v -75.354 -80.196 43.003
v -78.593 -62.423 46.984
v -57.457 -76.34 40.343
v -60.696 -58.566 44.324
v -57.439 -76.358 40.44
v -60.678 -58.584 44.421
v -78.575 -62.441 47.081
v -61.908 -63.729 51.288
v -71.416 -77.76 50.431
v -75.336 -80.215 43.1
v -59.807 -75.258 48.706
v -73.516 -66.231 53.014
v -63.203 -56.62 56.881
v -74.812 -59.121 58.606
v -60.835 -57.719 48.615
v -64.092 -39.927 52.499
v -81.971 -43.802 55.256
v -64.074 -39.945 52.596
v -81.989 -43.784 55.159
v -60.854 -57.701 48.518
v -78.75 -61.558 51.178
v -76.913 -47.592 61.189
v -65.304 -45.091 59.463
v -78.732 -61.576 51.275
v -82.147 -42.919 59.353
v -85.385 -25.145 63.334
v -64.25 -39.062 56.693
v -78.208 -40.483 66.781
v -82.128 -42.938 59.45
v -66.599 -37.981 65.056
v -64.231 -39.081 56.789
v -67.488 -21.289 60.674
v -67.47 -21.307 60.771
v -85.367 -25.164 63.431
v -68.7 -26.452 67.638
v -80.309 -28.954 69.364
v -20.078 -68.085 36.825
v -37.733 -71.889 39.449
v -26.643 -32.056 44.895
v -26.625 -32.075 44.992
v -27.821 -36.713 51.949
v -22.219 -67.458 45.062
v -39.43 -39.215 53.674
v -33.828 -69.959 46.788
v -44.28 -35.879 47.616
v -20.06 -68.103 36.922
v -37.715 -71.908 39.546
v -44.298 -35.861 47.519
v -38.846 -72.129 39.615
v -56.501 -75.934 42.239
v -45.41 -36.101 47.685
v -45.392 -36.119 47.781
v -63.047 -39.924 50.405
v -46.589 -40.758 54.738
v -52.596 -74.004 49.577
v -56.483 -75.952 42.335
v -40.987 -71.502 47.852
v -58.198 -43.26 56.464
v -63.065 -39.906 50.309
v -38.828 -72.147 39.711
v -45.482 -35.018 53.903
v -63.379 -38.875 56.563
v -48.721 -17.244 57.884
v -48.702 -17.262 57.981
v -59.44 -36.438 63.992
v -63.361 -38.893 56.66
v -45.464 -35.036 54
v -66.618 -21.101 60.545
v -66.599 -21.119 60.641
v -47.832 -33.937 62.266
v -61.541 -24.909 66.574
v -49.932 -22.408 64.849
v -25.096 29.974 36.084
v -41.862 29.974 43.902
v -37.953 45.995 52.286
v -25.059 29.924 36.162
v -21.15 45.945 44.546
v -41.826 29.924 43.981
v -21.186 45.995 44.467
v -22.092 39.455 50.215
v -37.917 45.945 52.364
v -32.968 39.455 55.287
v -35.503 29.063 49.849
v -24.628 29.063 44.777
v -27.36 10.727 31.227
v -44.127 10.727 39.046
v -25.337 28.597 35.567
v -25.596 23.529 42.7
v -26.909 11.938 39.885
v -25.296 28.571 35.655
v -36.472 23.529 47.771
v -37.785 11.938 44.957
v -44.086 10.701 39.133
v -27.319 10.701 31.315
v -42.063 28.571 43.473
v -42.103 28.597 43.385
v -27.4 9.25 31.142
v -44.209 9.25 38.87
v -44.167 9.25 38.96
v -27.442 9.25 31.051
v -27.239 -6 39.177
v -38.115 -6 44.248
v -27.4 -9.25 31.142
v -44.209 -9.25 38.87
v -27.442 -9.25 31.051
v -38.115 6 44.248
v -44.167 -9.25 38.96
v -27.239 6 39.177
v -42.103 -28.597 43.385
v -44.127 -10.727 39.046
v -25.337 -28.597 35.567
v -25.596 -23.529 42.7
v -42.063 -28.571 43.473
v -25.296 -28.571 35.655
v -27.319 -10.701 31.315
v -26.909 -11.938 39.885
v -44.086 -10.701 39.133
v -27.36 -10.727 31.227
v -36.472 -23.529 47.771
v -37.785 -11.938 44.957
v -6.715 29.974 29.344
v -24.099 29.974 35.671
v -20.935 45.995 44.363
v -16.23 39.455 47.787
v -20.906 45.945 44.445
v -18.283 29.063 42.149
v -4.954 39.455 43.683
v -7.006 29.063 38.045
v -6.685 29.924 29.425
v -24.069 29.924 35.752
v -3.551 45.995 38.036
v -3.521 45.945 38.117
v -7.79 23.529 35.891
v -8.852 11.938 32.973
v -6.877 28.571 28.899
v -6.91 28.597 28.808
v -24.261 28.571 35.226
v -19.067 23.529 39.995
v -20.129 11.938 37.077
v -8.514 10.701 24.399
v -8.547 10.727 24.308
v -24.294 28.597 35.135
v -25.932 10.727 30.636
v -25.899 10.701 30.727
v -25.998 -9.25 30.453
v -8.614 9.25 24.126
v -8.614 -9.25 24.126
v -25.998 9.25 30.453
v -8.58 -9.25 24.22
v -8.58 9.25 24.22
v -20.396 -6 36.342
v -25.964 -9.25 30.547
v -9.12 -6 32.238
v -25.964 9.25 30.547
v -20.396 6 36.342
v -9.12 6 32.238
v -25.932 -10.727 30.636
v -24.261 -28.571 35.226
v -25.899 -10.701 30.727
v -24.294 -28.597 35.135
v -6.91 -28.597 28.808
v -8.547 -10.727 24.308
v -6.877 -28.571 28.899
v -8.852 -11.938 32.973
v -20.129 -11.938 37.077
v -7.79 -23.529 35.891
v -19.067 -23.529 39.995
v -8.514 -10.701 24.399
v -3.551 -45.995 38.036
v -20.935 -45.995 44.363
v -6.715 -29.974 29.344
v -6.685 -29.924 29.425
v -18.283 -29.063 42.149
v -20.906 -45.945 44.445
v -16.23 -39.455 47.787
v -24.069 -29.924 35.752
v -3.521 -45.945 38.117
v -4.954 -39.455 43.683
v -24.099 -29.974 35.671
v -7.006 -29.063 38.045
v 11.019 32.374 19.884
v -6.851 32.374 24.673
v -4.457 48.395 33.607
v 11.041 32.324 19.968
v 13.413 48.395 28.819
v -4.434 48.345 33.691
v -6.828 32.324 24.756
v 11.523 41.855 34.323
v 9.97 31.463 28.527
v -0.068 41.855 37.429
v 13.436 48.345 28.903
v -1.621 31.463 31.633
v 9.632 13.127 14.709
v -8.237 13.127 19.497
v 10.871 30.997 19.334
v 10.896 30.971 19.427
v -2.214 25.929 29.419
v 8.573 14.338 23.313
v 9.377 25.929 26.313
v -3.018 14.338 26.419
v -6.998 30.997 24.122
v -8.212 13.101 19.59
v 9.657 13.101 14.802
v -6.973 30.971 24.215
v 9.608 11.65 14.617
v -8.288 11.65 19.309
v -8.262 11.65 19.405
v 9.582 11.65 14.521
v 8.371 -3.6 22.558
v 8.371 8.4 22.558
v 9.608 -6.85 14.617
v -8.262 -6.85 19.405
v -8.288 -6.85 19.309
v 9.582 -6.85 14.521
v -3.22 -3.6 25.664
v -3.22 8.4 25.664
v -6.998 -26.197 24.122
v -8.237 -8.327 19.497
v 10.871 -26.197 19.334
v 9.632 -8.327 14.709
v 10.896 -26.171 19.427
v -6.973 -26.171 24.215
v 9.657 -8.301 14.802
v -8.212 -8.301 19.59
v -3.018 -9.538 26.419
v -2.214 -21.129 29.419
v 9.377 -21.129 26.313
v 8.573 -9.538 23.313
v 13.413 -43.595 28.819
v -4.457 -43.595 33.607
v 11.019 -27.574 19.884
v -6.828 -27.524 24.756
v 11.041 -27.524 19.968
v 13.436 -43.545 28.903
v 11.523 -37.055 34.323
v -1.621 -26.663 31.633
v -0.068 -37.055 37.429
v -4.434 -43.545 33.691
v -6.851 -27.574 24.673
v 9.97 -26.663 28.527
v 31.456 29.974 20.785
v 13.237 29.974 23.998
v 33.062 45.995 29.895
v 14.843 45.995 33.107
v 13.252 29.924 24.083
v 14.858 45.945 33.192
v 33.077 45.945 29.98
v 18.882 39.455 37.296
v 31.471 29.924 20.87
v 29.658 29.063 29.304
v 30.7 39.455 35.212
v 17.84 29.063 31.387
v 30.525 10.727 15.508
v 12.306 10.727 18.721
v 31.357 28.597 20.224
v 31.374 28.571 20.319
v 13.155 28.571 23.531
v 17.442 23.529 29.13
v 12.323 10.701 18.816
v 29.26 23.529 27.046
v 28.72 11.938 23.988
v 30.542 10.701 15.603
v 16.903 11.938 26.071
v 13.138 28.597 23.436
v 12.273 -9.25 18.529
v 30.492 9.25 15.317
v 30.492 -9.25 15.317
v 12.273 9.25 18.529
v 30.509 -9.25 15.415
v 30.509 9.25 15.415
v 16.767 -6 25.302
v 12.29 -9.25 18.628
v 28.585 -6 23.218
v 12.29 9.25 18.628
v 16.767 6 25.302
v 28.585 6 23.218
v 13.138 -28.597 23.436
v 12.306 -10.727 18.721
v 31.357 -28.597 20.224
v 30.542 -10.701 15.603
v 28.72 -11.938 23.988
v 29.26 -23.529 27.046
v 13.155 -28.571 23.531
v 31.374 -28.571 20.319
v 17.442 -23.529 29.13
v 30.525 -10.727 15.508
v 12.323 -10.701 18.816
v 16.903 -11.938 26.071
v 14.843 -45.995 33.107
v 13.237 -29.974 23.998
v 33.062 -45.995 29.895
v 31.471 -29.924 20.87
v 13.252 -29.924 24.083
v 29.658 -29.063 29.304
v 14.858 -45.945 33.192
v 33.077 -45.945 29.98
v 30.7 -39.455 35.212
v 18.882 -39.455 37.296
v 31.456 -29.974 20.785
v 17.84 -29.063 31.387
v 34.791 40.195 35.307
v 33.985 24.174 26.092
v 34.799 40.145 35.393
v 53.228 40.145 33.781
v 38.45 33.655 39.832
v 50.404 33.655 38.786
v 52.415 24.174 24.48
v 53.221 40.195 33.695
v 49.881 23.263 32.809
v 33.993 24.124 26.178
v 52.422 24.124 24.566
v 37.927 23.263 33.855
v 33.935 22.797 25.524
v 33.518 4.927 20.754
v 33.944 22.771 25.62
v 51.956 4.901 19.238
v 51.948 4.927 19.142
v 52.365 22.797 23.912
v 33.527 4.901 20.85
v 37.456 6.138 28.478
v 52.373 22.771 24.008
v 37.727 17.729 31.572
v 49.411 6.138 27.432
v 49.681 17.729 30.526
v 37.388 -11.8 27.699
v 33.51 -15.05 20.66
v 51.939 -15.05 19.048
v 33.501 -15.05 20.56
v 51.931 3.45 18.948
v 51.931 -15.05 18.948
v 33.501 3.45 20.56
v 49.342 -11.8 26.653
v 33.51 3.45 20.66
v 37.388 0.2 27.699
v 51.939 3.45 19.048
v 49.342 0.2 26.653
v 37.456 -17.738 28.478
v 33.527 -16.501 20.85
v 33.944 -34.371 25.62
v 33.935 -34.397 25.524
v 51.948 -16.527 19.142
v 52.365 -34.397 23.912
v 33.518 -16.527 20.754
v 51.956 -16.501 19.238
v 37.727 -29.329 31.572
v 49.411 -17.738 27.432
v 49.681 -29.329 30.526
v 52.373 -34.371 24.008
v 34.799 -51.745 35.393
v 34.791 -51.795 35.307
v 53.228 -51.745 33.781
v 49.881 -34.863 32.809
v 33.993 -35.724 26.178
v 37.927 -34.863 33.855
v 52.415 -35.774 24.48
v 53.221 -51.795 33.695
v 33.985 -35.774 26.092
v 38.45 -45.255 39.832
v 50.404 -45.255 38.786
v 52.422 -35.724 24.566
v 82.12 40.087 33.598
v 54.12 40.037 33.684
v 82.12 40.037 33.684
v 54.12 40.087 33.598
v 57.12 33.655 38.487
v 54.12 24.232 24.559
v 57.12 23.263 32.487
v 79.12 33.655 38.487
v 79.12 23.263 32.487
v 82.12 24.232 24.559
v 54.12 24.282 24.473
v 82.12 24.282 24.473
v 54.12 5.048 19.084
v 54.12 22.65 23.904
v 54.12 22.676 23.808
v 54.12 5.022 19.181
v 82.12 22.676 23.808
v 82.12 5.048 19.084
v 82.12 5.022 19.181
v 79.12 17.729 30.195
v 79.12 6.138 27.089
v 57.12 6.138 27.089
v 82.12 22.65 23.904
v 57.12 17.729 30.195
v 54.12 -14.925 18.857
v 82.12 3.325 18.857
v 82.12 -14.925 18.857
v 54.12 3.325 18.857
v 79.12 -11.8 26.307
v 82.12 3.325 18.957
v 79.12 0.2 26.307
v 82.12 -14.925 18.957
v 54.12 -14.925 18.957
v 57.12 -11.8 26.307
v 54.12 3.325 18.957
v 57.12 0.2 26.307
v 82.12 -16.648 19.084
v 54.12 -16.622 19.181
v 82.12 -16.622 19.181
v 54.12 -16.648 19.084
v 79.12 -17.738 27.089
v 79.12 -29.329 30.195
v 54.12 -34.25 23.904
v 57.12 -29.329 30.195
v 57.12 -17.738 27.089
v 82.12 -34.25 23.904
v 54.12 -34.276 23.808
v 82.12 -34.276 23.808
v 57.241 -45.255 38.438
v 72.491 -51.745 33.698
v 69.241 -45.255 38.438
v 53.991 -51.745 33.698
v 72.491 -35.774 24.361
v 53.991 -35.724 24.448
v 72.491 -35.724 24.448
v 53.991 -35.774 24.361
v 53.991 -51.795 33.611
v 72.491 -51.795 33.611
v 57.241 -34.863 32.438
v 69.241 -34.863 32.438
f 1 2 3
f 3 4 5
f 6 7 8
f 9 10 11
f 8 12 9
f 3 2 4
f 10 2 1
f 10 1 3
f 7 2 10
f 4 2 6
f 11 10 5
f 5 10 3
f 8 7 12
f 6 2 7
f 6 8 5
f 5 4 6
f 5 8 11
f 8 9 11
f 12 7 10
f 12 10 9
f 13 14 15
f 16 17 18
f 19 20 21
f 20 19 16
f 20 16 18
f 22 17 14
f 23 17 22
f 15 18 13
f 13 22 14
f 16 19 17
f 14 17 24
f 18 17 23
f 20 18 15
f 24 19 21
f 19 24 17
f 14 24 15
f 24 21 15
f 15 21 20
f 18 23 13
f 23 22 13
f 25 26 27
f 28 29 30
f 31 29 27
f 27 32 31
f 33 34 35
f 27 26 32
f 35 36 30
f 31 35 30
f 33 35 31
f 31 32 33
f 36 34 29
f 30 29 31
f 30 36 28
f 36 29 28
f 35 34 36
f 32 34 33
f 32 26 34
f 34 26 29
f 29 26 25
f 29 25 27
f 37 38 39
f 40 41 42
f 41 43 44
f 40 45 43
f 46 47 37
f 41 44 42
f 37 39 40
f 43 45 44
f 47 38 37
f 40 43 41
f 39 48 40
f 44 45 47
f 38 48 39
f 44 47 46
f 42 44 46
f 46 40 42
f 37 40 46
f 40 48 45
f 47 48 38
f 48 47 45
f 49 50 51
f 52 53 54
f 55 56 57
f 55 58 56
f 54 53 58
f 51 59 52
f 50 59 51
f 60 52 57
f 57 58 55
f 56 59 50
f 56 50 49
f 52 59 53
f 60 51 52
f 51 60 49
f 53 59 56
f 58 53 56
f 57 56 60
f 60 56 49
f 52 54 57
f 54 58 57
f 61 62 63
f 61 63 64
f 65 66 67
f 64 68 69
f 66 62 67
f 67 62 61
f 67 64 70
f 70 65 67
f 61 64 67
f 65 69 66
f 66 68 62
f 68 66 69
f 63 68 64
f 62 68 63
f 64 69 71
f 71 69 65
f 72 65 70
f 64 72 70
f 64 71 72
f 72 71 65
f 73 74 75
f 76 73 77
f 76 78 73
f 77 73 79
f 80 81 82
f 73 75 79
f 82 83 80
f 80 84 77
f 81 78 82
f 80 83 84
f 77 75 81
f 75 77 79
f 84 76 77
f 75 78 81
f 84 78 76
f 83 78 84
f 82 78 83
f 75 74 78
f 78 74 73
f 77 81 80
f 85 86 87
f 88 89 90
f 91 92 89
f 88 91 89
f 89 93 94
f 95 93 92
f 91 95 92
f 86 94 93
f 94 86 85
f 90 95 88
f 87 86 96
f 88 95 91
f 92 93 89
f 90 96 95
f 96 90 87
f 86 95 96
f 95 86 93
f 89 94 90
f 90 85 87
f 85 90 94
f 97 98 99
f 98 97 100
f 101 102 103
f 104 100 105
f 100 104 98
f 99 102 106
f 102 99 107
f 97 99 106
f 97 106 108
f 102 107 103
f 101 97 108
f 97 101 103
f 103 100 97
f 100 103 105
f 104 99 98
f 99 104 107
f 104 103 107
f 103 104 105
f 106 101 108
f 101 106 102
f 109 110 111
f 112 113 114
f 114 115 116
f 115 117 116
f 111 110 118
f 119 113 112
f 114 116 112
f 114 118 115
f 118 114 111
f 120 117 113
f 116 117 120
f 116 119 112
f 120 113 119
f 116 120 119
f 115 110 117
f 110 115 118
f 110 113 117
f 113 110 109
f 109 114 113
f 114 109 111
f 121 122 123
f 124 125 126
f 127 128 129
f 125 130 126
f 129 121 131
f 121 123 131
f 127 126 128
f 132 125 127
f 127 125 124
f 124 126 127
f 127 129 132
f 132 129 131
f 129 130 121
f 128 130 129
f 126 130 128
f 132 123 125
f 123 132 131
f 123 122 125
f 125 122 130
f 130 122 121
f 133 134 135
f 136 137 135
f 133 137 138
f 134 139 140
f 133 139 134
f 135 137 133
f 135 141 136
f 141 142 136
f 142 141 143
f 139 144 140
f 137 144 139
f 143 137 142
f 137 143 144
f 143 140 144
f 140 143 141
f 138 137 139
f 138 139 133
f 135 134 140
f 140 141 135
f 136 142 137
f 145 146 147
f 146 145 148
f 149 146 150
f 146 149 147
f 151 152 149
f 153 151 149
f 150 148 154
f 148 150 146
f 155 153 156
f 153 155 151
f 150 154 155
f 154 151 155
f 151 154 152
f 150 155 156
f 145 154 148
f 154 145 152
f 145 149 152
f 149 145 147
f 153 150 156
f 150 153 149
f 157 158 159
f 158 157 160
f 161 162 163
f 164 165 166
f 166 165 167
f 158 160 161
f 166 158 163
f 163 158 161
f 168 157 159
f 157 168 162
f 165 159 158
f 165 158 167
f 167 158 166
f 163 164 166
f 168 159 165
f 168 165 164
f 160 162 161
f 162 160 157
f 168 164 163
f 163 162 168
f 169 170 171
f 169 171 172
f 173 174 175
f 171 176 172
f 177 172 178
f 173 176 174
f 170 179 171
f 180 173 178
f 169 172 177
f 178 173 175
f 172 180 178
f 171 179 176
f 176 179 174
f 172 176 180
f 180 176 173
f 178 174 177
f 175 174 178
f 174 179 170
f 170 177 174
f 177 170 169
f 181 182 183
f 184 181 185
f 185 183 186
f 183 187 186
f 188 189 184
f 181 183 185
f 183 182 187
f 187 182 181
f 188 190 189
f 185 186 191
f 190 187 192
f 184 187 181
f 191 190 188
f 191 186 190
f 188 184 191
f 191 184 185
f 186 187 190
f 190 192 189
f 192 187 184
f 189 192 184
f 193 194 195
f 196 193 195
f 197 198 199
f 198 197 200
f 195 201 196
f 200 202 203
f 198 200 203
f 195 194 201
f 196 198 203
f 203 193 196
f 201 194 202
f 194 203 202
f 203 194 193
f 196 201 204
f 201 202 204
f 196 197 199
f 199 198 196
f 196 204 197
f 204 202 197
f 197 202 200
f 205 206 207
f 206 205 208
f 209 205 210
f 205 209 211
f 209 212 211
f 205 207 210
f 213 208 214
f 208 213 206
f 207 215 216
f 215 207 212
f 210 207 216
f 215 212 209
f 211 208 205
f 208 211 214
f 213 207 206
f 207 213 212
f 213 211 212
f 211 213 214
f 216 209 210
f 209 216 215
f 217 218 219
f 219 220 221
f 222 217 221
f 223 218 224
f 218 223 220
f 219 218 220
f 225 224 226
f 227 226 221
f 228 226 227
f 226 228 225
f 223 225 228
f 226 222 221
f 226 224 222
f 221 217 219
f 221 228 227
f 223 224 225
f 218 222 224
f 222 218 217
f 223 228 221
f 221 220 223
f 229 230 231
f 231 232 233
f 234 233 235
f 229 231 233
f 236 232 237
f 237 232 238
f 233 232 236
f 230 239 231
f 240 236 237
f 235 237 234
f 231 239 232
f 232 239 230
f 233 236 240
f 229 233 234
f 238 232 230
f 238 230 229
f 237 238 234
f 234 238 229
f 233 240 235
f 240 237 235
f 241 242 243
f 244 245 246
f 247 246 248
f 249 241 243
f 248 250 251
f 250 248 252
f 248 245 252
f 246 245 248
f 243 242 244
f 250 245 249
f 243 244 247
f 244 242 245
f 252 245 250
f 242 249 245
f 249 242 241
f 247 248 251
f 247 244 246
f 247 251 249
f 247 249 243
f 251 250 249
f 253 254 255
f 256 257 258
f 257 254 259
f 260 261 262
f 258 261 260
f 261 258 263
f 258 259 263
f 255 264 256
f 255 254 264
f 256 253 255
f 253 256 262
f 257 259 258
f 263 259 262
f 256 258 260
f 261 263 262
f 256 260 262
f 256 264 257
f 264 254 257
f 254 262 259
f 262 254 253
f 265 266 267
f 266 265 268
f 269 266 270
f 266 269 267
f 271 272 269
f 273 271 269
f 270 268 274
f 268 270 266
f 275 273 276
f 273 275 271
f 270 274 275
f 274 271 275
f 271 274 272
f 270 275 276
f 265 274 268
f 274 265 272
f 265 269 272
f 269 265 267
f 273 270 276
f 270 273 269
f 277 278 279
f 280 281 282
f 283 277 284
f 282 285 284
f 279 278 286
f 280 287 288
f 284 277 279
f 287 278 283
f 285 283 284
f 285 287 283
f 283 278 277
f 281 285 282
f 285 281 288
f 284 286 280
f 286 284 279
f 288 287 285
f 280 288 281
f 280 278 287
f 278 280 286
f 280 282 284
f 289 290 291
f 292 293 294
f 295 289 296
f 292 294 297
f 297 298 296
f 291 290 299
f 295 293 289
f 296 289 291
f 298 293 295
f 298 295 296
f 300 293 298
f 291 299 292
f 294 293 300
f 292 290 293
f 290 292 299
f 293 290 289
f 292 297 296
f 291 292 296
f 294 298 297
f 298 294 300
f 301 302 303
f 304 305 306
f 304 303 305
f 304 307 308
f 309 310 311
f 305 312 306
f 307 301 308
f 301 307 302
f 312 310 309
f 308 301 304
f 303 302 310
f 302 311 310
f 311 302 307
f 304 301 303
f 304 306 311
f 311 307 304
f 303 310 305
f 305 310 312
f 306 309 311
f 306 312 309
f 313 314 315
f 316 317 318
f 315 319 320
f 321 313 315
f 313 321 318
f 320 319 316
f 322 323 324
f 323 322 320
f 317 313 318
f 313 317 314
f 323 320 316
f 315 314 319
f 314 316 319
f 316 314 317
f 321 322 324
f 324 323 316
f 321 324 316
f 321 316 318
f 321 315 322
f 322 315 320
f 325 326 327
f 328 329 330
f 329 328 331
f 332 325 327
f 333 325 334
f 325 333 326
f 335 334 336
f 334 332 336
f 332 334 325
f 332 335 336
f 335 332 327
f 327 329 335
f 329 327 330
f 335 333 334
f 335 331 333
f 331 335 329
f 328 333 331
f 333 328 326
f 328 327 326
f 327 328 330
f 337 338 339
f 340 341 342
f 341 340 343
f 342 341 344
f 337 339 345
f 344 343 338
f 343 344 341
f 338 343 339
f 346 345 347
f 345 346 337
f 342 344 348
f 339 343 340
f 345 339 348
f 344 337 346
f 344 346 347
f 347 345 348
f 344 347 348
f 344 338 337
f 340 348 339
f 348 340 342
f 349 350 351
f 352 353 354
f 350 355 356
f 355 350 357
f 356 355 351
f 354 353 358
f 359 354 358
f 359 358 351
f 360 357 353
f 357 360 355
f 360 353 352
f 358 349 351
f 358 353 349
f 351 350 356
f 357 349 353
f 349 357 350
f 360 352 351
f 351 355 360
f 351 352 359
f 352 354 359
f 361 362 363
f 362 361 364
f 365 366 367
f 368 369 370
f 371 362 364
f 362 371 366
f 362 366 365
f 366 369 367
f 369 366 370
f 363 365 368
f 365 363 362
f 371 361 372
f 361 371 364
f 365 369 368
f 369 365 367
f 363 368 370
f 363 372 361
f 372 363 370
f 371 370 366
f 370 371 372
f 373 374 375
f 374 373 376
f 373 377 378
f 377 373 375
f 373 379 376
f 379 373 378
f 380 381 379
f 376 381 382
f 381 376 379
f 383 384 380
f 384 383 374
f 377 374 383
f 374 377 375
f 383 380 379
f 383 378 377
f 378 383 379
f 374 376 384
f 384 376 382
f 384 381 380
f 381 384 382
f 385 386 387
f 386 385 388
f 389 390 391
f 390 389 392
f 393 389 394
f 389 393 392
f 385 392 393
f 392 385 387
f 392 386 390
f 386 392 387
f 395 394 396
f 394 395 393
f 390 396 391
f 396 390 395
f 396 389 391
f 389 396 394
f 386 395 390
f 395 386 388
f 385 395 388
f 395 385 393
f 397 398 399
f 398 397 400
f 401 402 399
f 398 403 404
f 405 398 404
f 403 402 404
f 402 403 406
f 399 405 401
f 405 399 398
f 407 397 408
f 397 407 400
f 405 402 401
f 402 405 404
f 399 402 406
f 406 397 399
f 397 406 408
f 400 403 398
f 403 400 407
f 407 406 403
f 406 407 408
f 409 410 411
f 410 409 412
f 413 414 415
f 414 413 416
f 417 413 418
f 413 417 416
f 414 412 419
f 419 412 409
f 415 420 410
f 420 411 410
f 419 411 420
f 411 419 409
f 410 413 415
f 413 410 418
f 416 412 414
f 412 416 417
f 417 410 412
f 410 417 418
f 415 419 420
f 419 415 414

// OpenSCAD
union () {
  union () {
    translate ([-52, -45, 40]) {
      rotate (a=14.999999999999998, v=[1, 1, 0]) {
        rotate (a=11.25, v=[0, 0, 1]) {
          translate ([-0.0, -9.7, 0]) {
            translate ([17.4, 0, 0]) {
              color ([127/255, 53/85, 127/255, 1]) {
                translate ([0, 0, 7]) {
                  hull () {
                    translate ([0, 0, 0.05]) {
                      linear_extrude (height=0.1, twist=0.0, convexity=0, center=true){
                        polygon (points=[[9.125, 18.75], [9.125, -18.75], [-9.125, -18.75], [-9.125, 18.75]]);
                      }
                    }
                    translate ([0, 0, 7.4]) {
                      linear_extrude (height=0.1, twist=0.0, convexity=0, center=true){
                        polygon (points=[[6, 16], [6, -16], [-6, -16], [-6, 16]]);
                      }
                    }
                  }
                }
              }
            }
          }
        }
      }
    }
    translate ([-52, -45, 40]) {
      rotate (a=14.999999999999998, v=[1, 1, 0]) {
        rotate (a=11.25, v=[0, 0, 1]) {
          translate ([-19.4, -9.7, 0]) {
            translate ([17.4, 0, 0]) {
              color ([127/255, 53/85, 127/255, 1]) {
                translate ([0, 0, 7]) {
                  hull () {
                    translate ([0, 0, 0.05]) {
                      linear_extrude (height=0.1, twist=0.0, convexity=0, center=true){
                        polygon (points=[[9.125, 18.75], [9.125, -18.75], [-9.125, -18.75], [-9.125, 18.75]]);
                      }
                    }
                    translate ([0, 0, 7.4]) {
                      linear_extrude (height=0.1, twist=0.0, convexity=0, center=true){
                        polygon (points=[[6, 16], [6, -16], [-6, -16], [-6, 16]]);
                      }
                    }
                  }
                }
              }
            }
          }
        }
      }
    }
    translate ([-52, -45, 46]) {
      rotate (a=14.999999999999998, v=[1, 1, 0]) {
        rotate (a=11.25, v=[0, 0, 1]) {
          translate ([-19.4, 19.4, 0]) {
            translate ([17.4, 0, 0]) {
              color ([44/51, 163/255, 163/255, 1]) {
                translate ([0, 0, 7]) {
                  hull () {
                    translate ([0, 0, 0.05]) {
                      linear_extrude (height=0.1, twist=0.0, convexity=0, center=true){
                        polygon (points=[[9.25, 9.25], [9.25, -9.25], [-9.25, -9.25], [-9.25, 9.25]]);
                      }
                    }
                    translate ([0, 0, 6]) {
                      linear_extrude (height=0.1, twist=0.0, convexity=0, center=true){
                        polygon (points=[[3.7, 3.7], [3.7, -3.7], [-3.7, -3.7], [-3.7, 3.7]]);
                      }
                    }
                    translate ([0, 0, 7.4]) {
                      linear_extrude (height=0.1, twist=0.0, convexity=0, center=true){
                        polygon (points=[[6, 6], [6, -6], [-6, -6], [-6, 6]]);
                      }
                    }
                  }
                }
              }
            }
          }
        }
      }
    }
    union () {
      translate ([-52, -45, 38]) {
        rotate (a=14.999999999999998, v=[1, 1, 0]) {
          rotate (a=11.25, v=[0, 0, 1]) {
            translate ([-38.8, -19.4, 0]) {
              translate ([17.4, 0, 0]) {
                color ([44/51, 163/255, 163/255, 1]) {
                  translate ([0, 0, 7]) {
                    hull () {
                      translate ([0, 0, 0.05]) {
                        linear_extrude (height=0.1, twist=0.0, convexity=0, center=true){
                          polygon (points=[[9.25, 9.25], [9.25, -9.25], [-9.25, -9.25], [-9.25, 9.25]]);
                        }
                      }
                      translate ([0, 0, 6]) {
                        linear_extrude (height=0.1, twist=0.0, convexity=0, center=true){
                          polygon (points=[[3.7, 3.7], [3.7, -3.7], [-3.7, -3.7], [-3.7, 3.7]]);
                        }
                      }
                      translate ([0, 0, 7.4]) {
                        linear_extrude (height=0.1, twist=0.0, convexity=0, center=true){
                          polygon (points=[[6, 6], [6, -6], [-6, -6], [-6, 6]]);
                        }
                      }
                    }
                  }
                }
              }
            }
          }
        }
      }
      translate ([-52, -45, 42]) {
        rotate (a=14.999999999999998, v=[1, 1, 0]) {
          rotate (a=11.25, v=[0, 0, 1]) {
            translate ([-38.8, 0.0, 0]) {
              translate ([17.4, 0, 0]) {
                color ([44/51, 163/255, 163/255, 1]) {
                  translate ([0, 0, 7]) {
                    hull () {
                      translate ([0, 0, 0.05]) {
                        linear_extrude (height=0.1, twist=0.0, convexity=0, center=true){
                          polygon (points=[[9.25, 9.25], [9.25, -9.25], [-9.25, -9.25], [-9.25, 9.25]]);
                        }
                      }
                      translate ([0, 0, 6]) {
                        linear_extrude (height=0.1, twist=0.0, convexity=0, center=true){
                          polygon (points=[[3.7, 3.7], [3.7, -3.7], [-3.7, -3.7], [-3.7, 3.7]]);
                        }
                      }
                      translate ([0, 0, 7.4]) {
                        linear_extrude (height=0.1, twist=0.0, convexity=0, center=true){
                          polygon (points=[[6, 6], [6, -6], [-6, -6], [-6, 6]]);
                        }
                      }
                    }
                  }
                }
              }
            }
          }
        }
      }
      translate ([-52, -45, 46]) {
        rotate (a=14.999999999999998, v=[1, 1, 0]) {
          rotate (a=11.25, v=[0, 0, 1]) {
            translate ([-38.8, 19.4, 0]) {
              translate ([17.4, 0, 0]) {
                color ([44/51, 163/255, 163/255, 1]) {
                  translate ([0, 0, 7]) {
                    hull () {
                      translate ([0, 0, 0.05]) {
                        linear_extrude (height=0.1, twist=0.0, convexity=0, center=true){
                          polygon (points=[[9.25, 9.25], [9.25, -9.25], [-9.25, -9.25], [-9.25, 9.25]]);
                        }
                      }
                      translate ([0, 0, 6]) {
                        linear_extrude (height=0.1, twist=0.0, convexity=0, center=true){
                          polygon (points=[[3.7, 3.7], [3.7, -3.7], [-3.7, -3.7], [-3.7, 3.7]]);
                        }
                      }
                      translate ([0, 0, 7.4]) {
                        linear_extrude (height=0.1, twist=0.0, convexity=0, center=true){
                          polygon (points=[[6, 6], [6, -6], [-6, -6], [-6, 6]]);
                        }
                      }
                    }
                  }
                }
              }
            }
          }
        }
      }
    }
  }
  union () {
    translate ([0, 0, 14.5]) {
      rotate (a=14.999999999999998, v=[0, 1, 0]) {
        translate ([0, 0, 0]) {
          translate ([0, 0, 236.77818057271747]) {
            rotate (a=10.0, v=[0, 1, 0]) {
              translate ([0, 0, -236.77818057271747]) {
                translate ([0, 0, 82.96861330108649]) {
                  rotate (a=29.999999999999996, v=[1, 0, 0]) {
                    translate ([0, 0, -82.96861330108649]) {
                      color ([44/51, 163/255, 163/255, 1]) {
                        translate ([0, 0, 7]) {
                          hull () {
                            translate ([0, 0, 0.05]) {
                              linear_extrude (height=0.1, twist=0.0, convexity=0, center=true){
                                polygon (points=[[9.25, 9.25], [9.25, -9.25], [-9.25, -9.25], [-9.25, 9.25]]);
                              }
                            }
                            translate ([0, 0, 6]) {
                              linear_extrude (height=0.1, twist=0.0, convexity=0, center=true){
                                polygon (points=[[3.7, 3.7], [3.7, -3.7], [-3.7, -3.7], [-3.7, 3.7]]);
                              }
                            }
                            translate ([0, 0, 7.4]) {
                              linear_extrude (height=0.1, twist=0.0, convexity=0, center=true){
                                polygon (points=[[6, 6], [6, -6], [-6, -6], [-6, 6]]);
                              }
                            }
                          }
                        }
                      }
                    }
                  }
                }
              }
            }
          }
        }
      }
    }
    translate ([0, 0, 14.5]) {
      rotate (a=14.999999999999998, v=[0, 1, 0]) {
        translate ([0, 0, 0]) {
          translate ([0, 0, 236.77818057271747]) {
            rotate (a=10.0, v=[0, 1, 0]) {
              translate ([0, 0, -236.77818057271747]) {
                translate ([0, 0, 82.96861330108649]) {
                  rotate (a=14.999999999999998, v=[1, 0, 0]) {
                    translate ([0, 0, -82.96861330108649]) {
                      color ([44/51, 163/255, 163/255, 1]) {
                        translate ([0, 0, 7]) {
                          hull () {
                            translate ([0, 0, 0.05]) {
                              linear_extrude (height=0.1, twist=0.0, convexity=0, center=true){
                                polygon (points=[[9.25, 9.25], [9.25, -9.25], [-9.25, -9.25], [-9.25, 9.25]]);
                              }
                            }
                            translate ([0, 0, 6]) {
                              linear_extrude (height=0.1, twist=0.0, convexity=0, center=true){
                                polygon (points=[[3.7, 3.7], [3.7, -3.7], [-3.7, -3.7], [-3.7, 3.7]]);
                              }
                            }
                            translate ([0, 0, 7.4]) {
                              linear_extrude (height=0.1, twist=0.0, convexity=0, center=true){
                                polygon (points=[[6, 6], [6, -6], [-6, -6], [-6, 6]]);
                              }
                            }
                          }
                        }
                      }
                    }
                  }
                }
              }
            }
          }
        }
      }
    }
    translate ([0, 0, 14.5]) {
      rotate (a=14.999999999999998, v=[0, 1, 0]) {
        translate ([0, 0, 0]) {
          translate ([0, 0, 236.77818057271747]) {
            rotate (a=10.0, v=[0, 1, 0]) {
              translate ([0, 0, -236.77818057271747]) {
                translate ([0, 0, 82.96861330108649]) {
                  rotate (a=0.0, v=[1, 0, 0]) {
                    translate ([0, 0, -82.96861330108649]) {
                      color ([44/51, 163/255, 163/255, 1]) {
                        translate ([0, 0, 7]) {
                          hull () {
                            translate ([0, 0, 0.05]) {
                              linear_extrude (height=0.1, twist=0.0, convexity=0, center=true){
                                polygon (points=[[9.25, 9.25], [9.25, -9.25], [-9.25, -9.25], [-9.25, 9.25]]);
                              }
                            }
                            translate ([0, 0, 6]) {
                              linear_extrude (height=0.1, twist=0.0, convexity=0, center=true){
                                polygon (points=[[3.7, 3.7], [3.7, -3.7], [-3.7, -3.7], [-3.7, 3.7]]);
                              }
                            }
                            translate ([0, 0, 7.4]) {
                              linear_extrude (height=0.1, twist=0.0, convexity=0, center=true){
                                polygon (points=[[6, 6], [6, -6], [-6, -6], [-6, 6]]);
                              }
                            }
                          }
                        }
                      }
                    }
                  }
                }
              }
            }
          }
        }
      }
    }
    translate ([0, 0, 14.5]) {
      rotate (a=14.999999999999998, v=[0, 1, 0]) {
        translate ([0, 0, 0]) {
          translate ([0, 0, 236.77818057271747]) {
            rotate (a=10.0, v=[0, 1, 0]) {
              translate ([0, 0, -236.77818057271747]) {
                translate ([0, 0, 82.96861330108649]) {
                  rotate (a=-14.999999999999998, v=[1, 0, 0]) {
                    translate ([0, 0, -82.96861330108649]) {
                      color ([44/51, 163/255, 163/255, 1]) {
                        translate ([0, 0, 7]) {
                          hull () {
                            translate ([0, 0, 0.05]) {
                              linear_extrude (height=0.1, twist=0.0, convexity=0, center=true){
                                polygon (points=[[9.25, 9.25], [9.25, -9.25], [-9.25, -9.25], [-9.25, 9.25]]);
                              }
                            }
                            translate ([0, 0, 6]) {
                              linear_extrude (height=0.1, twist=0.0, convexity=0, center=true){
                                polygon (points=[[3.7, 3.7], [3.7, -3.7], [-3.7, -3.7], [-3.7, 3.7]]);
                              }
                            }
                            translate ([0, 0, 7.4]) {
                              linear_extrude (height=0.1, twist=0.0, convexity=0, center=true){
                                polygon (points=[[6, 6], [6, -6], [-6, -6], [-6, 6]]);
                              }
                            }
                          }
                        }
                      }
                    }
                  }
                }
              }
            }
          }
        }
      }
    }
    translate ([0, 0, 14.5]) {
      rotate (a=14.999999999999998, v=[0, 1, 0]) {
        translate ([0, 0, 0]) {
          translate ([0, 0, 236.77818057271747]) {
            rotate (a=5.0, v=[0, 1, 0]) {
              translate ([0, 0, -236.77818057271747]) {
                translate ([0, 0, 82.96861330108649]) {
                  rotate (a=29.999999999999996, v=[1, 0, 0]) {
                    translate ([0, 0, -82.96861330108649]) {
                      color ([44/51, 163/255, 163/255, 1]) {
                        translate ([0, 0, 7]) {
                          hull () {
                            translate ([0, 0, 0.05]) {
                              linear_extrude (height=0.1, twist=0.0, convexity=0, center=true){
                                polygon (points=[[9.25, 9.25], [9.25, -9.25], [-9.25, -9.25], [-9.25, 9.25]]);
                              }
                            }
                            translate ([0, 0, 6]) {
                              linear_extrude (height=0.1, twist=0.0, convexity=0, center=true){
                                polygon (points=[[3.7, 3.7], [3.7, -3.7], [-3.7, -3.7], [-3.7, 3.7]]);
                              }
                            }
                            translate ([0, 0, 7.4]) {
                              linear_extrude (height=0.1, twist=0.0, convexity=0, center=true){
                                polygon (points=[[6, 6], [6, -6], [-6, -6], [-6, 6]]);
                              }
                            }
                          }
                        }
                      }
                    }
                  }
                }
              }
            }
          }
        }
      }
    }
    translate ([0, 0, 14.5]) {
      rotate (a=14.999999999999998, v=[0, 1, 0]) {
        translate ([0, 0, 0]) {
          translate ([0, 0, 236.77818057271747]) {
            rotate (a=5.0, v=[0, 1, 0]) {
              translate ([0, 0, -236.77818057271747]) {
                translate ([0, 0, 82.96861330108649]) {
                  rotate (a=14.999999999999998, v=[1, 0, 0]) {
                    translate ([0, 0, -82.96861330108649]) {
                      color ([44/51, 163/255, 163/255, 1]) {
                        translate ([0, 0, 7]) {
                          hull () {
                            translate ([0, 0, 0.05]) {
                              linear_extrude (height=0.1, twist=0.0, convexity=0, center=true){
                                polygon (points=[[9.25, 9.25], [9.25, -9.25], [-9.25, -9.25], [-9.25, 9.25]]);
                              }
                            }
                            translate ([0, 0, 6]) {
                              linear_extrude (height=0.1, twist=0.0, convexity=0, center=true){
                                polygon (points=[[3.7, 3.7], [3.7, -3.7], [-3.7, -3.7], [-3.7, 3.7]]);
                              }
                            }
                            translate ([0, 0, 7.4]) {
                              linear_extrude (height=0.1, twist=0.0, convexity=0, center=true){
                                polygon (points=[[6, 6], [6, -6], [-6, -6], [-6, 6]]);
                              }
                            }
                          }
                        }
                      }
                    }
                  }
                }
              }
            }
          }
        }
      }
    }
    translate ([0, 0, 14.5]) {
      rotate (a=14.999999999999998, v=[0, 1, 0]) {
        translate ([0, 0, 0]) {
          translate ([0, 0, 236.77818057271747]) {
            rotate (a=5.0, v=[0, 1, 0]) {
              translate ([0, 0, -236.77818057271747]) {
                translate ([0, 0, 82.96861330108649]) {
                  rotate (a=0.0, v=[1, 0, 0]) {
                    translate ([0, 0, -82.96861330108649]) {
                      color ([44/51, 163/255, 163/255, 1]) {
                        translate ([0, 0, 7]) {
                          hull () {
                            translate ([0, 0, 0.05]) {
                              linear_extrude (height=0.1, twist=0.0, convexity=0, center=true){
                                polygon (points=[[9.25, 9.25], [9.25, -9.25], [-9.25, -9.25], [-9.25, 9.25]]);
                              }
                            }
                            translate ([0, 0, 6]) {
                              linear_extrude (height=0.1, twist=0.0, convexity=0, center=true){
                                polygon (points=[[3.7, 3.7], [3.7, -3.7], [-3.7, -3.7], [-3.7, 3.7]]);
                              }
                            }
                            translate ([0, 0, 7.4]) {
                              linear_extrude (height=0.1, twist=0.0, convexity=0, center=true){
                                polygon (points=[[6, 6], [6, -6], [-6, -6], [-6, 6]]);
                              }
                            }
                          }
                        }
                      }
                    }
                  }
                }
              }
            }
          }
        }
      }
    }
    translate ([0, 0, 14.5]) {
      rotate (a=14.999999999999998, v=[0, 1, 0]) {
        translate ([0, 0, 0]) {
          translate ([0, 0, 236.77818057271747]) {
            rotate (a=5.0, v=[0, 1, 0]) {
              translate ([0, 0, -236.77818057271747]) {
                translate ([0, 0, 82.96861330108649]) {
                  rotate (a=-14.999999999999998, v=[1, 0, 0]) {
                    translate ([0, 0, -82.96861330108649]) {
                      color ([44/51, 163/255, 163/255, 1]) {
                        translate ([0, 0, 7]) {
                          hull () {
                            translate ([0, 0, 0.05]) {
                              linear_extrude (height=0.1, twist=0.0, convexity=0, center=true){
                                polygon (points=[[9.25, 9.25], [9.25, -9.25], [-9.25, -9.25], [-9.25, 9.25]]);
                              }
                            }
                            translate ([0, 0, 6]) {
                              linear_extrude (height=0.1, twist=0.0, convexity=0, center=true){
                                polygon (points=[[3.7, 3.7], [3.7, -3.7], [-3.7, -3.7], [-3.7, 3.7]]);
                              }
                            }
                            translate ([0, 0, 7.4]) {
                              linear_extrude (height=0.1, twist=0.0, convexity=0, center=true){
                                polygon (points=[[6, 6], [6, -6], [-6, -6], [-6, 6]]);
                              }
                            }
                          }
                        }
                      }
                    }
                  }
                }
              }
            }
          }
        }
      }
    }
    translate ([0, 0, 14.5]) {
      rotate (a=14.999999999999998, v=[0, 1, 0]) {
        translate ([0, 0, 0]) {
          translate ([0, 0, 236.77818057271747]) {
            rotate (a=5.0, v=[0, 1, 0]) {
              translate ([0, 0, -236.77818057271747]) {
                translate ([0, 0, 82.96861330108649]) {
                  rotate (a=-29.999999999999996, v=[1, 0, 0]) {
                    translate ([0, 0, -82.96861330108649]) {
                      color ([44/51, 163/255, 163/255, 1]) {
                        translate ([0, 0, 7]) {
                          hull () {
                            translate ([0, 0, 0.05]) {
                              linear_extrude (height=0.1, twist=0.0, convexity=0, center=true){
                                polygon (points=[[9.25, 9.25], [9.25, -9.25], [-9.25, -9.25], [-9.25, 9.25]]);
                              }
                            }
                            translate ([0, 0, 6]) {
                              linear_extrude (height=0.1, twist=0.0, convexity=0, center=true){
                                polygon (points=[[3.7, 3.7], [3.7, -3.7], [-3.7, -3.7], [-3.7, 3.7]]);
                              }
                            }
                            translate ([0, 0, 7.4]) {
                              linear_extrude (height=0.1, twist=0.0, convexity=0, center=true){
                                polygon (points=[[6, 6], [6, -6], [-6, -6], [-6, 6]]);
                              }
                            }
                          }
                        }
                      }
                    }
                  }
                }
              }
            }
          }
        }
      }
    }
    translate ([0, 0, 14.5]) {
      rotate (a=14.999999999999998, v=[0, 1, 0]) {
        translate ([0, 2.4, -4.5]) {
          translate ([0, 0, 236.77818057271747]) {
            rotate (a=0.0, v=[0, 1, 0]) {
              translate ([0, 0, -236.77818057271747]) {
                translate ([0, 0, 82.96861330108649]) {
                  rotate (a=29.999999999999996, v=[1, 0, 0]) {
                    translate ([0, 0, -82.96861330108649]) {
                      color ([44/51, 163/255, 163/255, 1]) {
                        translate ([0, 0, 7]) {
                          hull () {
                            translate ([0, 0, 0.05]) {
                              linear_extrude (height=0.1, twist=0.0, convexity=0, center=true){
                                polygon (points=[[9.25, 9.25], [9.25, -9.25], [-9.25, -9.25], [-9.25, 9.25]]);
                              }
                            }
                            translate ([0, 0, 6]) {
                              linear_extrude (height=0.1, twist=0.0, convexity=0, center=true){
                                polygon (points=[[3.7, 3.7], [3.7, -3.7], [-3.7, -3.7], [-3.7, 3.7]]);
                              }
                            }
                            translate ([0, 0, 7.4]) {
                              linear_extrude (height=0.1, twist=0.0, convexity=0, center=true){
                                polygon (points=[[6, 6], [6, -6], [-6, -6], [-6, 6]]);
                              }
                            }
                          }
                        }
                      }
                    }
                  }
                }
              }
            }
          }
        }
      }
    }
    translate ([0, 0, 14.5]) {
      rotate (a=14.999999999999998, v=[0, 1, 0]) {
        translate ([0, 2.4, -4.5]) {
          translate ([0, 0, 236.77818057271747]) {
            rotate (a=0.0, v=[0, 1, 0]) {
              translate ([0, 0, -236.77818057271747]) {
                translate ([0, 0, 82.96861330108649]) {
                  rotate (a=14.999999999999998, v=[1, 0, 0]) {
                    translate ([0, 0, -82.96861330108649]) {
                      color ([44/51, 163/255, 163/255, 1]) {
                        translate ([0, 0, 7]) {
                          hull () {
                            translate ([0, 0, 0.05]) {
                              linear_extrude (height=0.1, twist=0.0, convexity=0, center=true){
                                polygon (points=[[9.25, 9.25], [9.25, -9.25], [-9.25, -9.25], [-9.25, 9.25]]);
                              }
                            }
                            translate ([0, 0, 6]) {
                              linear_extrude (height=0.1, twist=0.0, convexity=0, center=true){
                                polygon (points=[[3.7, 3.7], [3.7, -3.7], [-3.7, -3.7], [-3.7, 3.7]]);
                              }
                            }
                            translate ([0, 0, 7.4]) {
                              linear_extrude (height=0.1, twist=0.0, convexity=0, center=true){
                                polygon (points=[[6, 6], [6, -6], [-6, -6], [-6, 6]]);
                              }
                            }
                          }
                        }
                      }
                    }
                  }
                }
              }
            }
          }
        }
      }
    }
    translate ([0, 0, 14.5]) {
      rotate (a=14.999999999999998, v=[0, 1, 0]) {
        translate ([0, 2.4, -4.5]) {
          translate ([0, 0, 236.77818057271747]) {
            rotate (a=0.0, v=[0, 1, 0]) {
              translate ([0, 0, -236.77818057271747]) {
                translate ([0, 0, 82.96861330108649]) {
                  rotate (a=0.0, v=[1, 0, 0]) {
                    translate ([0, 0, -82.96861330108649]) {
                      color ([44/51, 163/255, 163/255, 1]) {
                        translate ([0, 0, 7]) {
                          hull () {
                            translate ([0, 0, 0.05]) {
                              linear_extrude (height=0.1, twist=0.0, convexity=0, center=true){
                                polygon (points=[[9.25, 9.25], [9.25, -9.25], [-9.25, -9.25], [-9.25, 9.25]]);
                              }
                            }
                            translate ([0, 0, 6]) {
                              linear_extrude (height=0.1, twist=0.0, convexity=0, center=true){
                                polygon (points=[[3.7, 3.7], [3.7, -3.7], [-3.7, -3.7], [-3.7, 3.7]]);
                              }
                            }
                            translate ([0, 0, 7.4]) {
                              linear_extrude (height=0.1, twist=0.0, convexity=0, center=true){
                                polygon (points=[[6, 6], [6, -6], [-6, -6], [-6, 6]]);
                              }
                            }
                          }
                        }
                      }
                    }
                  }
                }
              }
            }
          }
        }
      }
    }
    translate ([0, 0, 14.5]) {
      rotate (a=14.999999999999998, v=[0, 1, 0]) {
        translate ([0, 2.4, -4.5]) {
          translate ([0, 0, 236.77818057271747]) {
            rotate (a=0.0, v=[0, 1, 0]) {
              translate ([0, 0, -236.77818057271747]) {
                translate ([0, 0, 82.96861330108649]) {
                  rotate (a=-14.999999999999998, v=[1, 0, 0]) {
                    translate ([0, 0, -82.96861330108649]) {
                      color ([44/51, 163/255, 163/255, 1]) {
                        translate ([0, 0, 7]) {
                          hull () {
                            translate ([0, 0, 0.05]) {
                              linear_extrude (height=0.1, twist=0.0, convexity=0, center=true){
                                polygon (points=[[9.25, 9.25], [9.25, -9.25], [-9.25, -9.25], [-9.25, 9.25]]);
                              }
                            }
                            translate ([0, 0, 6]) {
                              linear_extrude (height=0.1, twist=0.0, convexity=0, center=true){
                                polygon (points=[[3.7, 3.7], [3.7, -3.7], [-3.7, -3.7], [-3.7, 3.7]]);
                              }
                            }
                            translate ([0, 0, 7.4]) {
                              linear_extrude (height=0.1, twist=0.0, convexity=0, center=true){
                                polygon (points=[[6, 6], [6, -6], [-6, -6], [-6, 6]]);
                              }
                            }
                          }
                        }
                      }
                    }
                  }
                }
              }
            }
          }
        }
      }
    }
    translate ([0, 0, 14.5]) {
      rotate (a=14.999999999999998, v=[0, 1, 0]) {
        translate ([0, 2.4, -4.5]) {
          translate ([0, 0, 236.77818057271747]) {
            rotate (a=0.0, v=[0, 1, 0]) {
              translate ([0, 0, -236.77818057271747]) {
                translate ([0, 0, 82.96861330108649]) {
                  rotate (a=-29.999999999999996, v=[1, 0, 0]) {
                    translate ([0, 0, -82.96861330108649]) {
                      color ([44/51, 163/255, 163/255, 1]) {
                        translate ([0, 0, 7]) {
                          hull () {
                            translate ([0, 0, 0.05]) {
                              linear_extrude (height=0.1, twist=0.0, convexity=0, center=true){
                                polygon (points=[[9.25, 9.25], [9.25, -9.25], [-9.25, -9.25], [-9.25, 9.25]]);
                              }
                            }
                            translate ([0, 0, 6]) {
                              linear_extrude (height=0.1, twist=0.0, convexity=0, center=true){
                                polygon (points=[[3.7, 3.7], [3.7, -3.7], [-3.7, -3.7], [-3.7, 3.7]]);
                              }
                            }
                            translate ([0, 0, 7.4]) {
                              linear_extrude (height=0.1, twist=0.0, convexity=0, center=true){
                                polygon (points=[[6, 6], [6, -6], [-6, -6], [-6, 6]]);
                              }
                            }
                          }
                        }
                      }
                    }
                  }
                }
              }
            }
          }
        }
      }
    }
    translate ([0, 0, 14.5]) {
      rotate (a=14.999999999999998, v=[0, 1, 0]) {
        translate ([0, 0, 0]) {
          translate ([0, 0, 236.77818057271747]) {
            rotate (a=-5.0, v=[0, 1, 0]) {
              translate ([0, 0, -236.77818057271747]) {
                translate ([0, 0, 82.96861330108649]) {
                  rotate (a=29.999999999999996, v=[1, 0, 0]) {
                    translate ([0, 0, -82.96861330108649]) {
                      color ([44/51, 163/255, 163/255, 1]) {
                        translate ([0, 0, 7]) {
                          hull () {
                            translate ([0, 0, 0.05]) {
                              linear_extrude (height=0.1, twist=0.0, convexity=0, center=true){
                                polygon (points=[[9.25, 9.25], [9.25, -9.25], [-9.25, -9.25], [-9.25, 9.25]]);
                              }
                            }
                            translate ([0, 0, 6]) {
                              linear_extrude (height=0.1, twist=0.0, convexity=0, center=true){
                                polygon (points=[[3.7, 3.7], [3.7, -3.7], [-3.7, -3.7], [-3.7, 3.7]]);
                              }
                            }
                            translate ([0, 0, 7.4]) {
                              linear_extrude (height=0.1, twist=0.0, convexity=0, center=true){
                                polygon (points=[[6, 6], [6, -6], [-6, -6], [-6, 6]]);
                              }
                            }
                          }
                        }
                      }
                    }
                  }
                }
              }
            }
          }
        }
      }
    }
    translate ([0, 0, 14.5]) {
      rotate (a=14.999999999999998, v=[0, 1, 0]) {
        translate ([0, 0, 0]) {
          translate ([0, 0, 236.77818057271747]) {
            rotate (a=-5.0, v=[0, 1, 0]) {
              translate ([0, 0, -236.77818057271747]) {
                translate ([0, 0, 82.96861330108649]) {
                  rotate (a=14.999999999999998, v=[1, 0, 0]) {
                    translate ([0, 0, -82.96861330108649]) {
                      color ([44/51, 163/255, 163/255, 1]) {
                        translate ([0, 0, 7]) {
                          hull () {
                            translate ([0, 0, 0.05]) {
                              linear_extrude (height=0.1, twist=0.0, convexity=0, center=true){
                                polygon (points=[[9.25, 9.25], [9.25, -9.25], [-9.25, -9.25], [-9.25, 9.25]]);
                              }
                            }
                            translate ([0, 0, 6]) {
                              linear_extrude (height=0.1, twist=0.0, convexity=0, center=true){
                                polygon (points=[[3.7, 3.7], [3.7, -3.7], [-3.7, -3.7], [-3.7, 3.7]]);
                              }
                            }
                            translate ([0, 0, 7.4]) {
                              linear_extrude (height=0.1, twist=0.0, convexity=0, center=true){
                                polygon (points=[[6, 6], [6, -6], [-6, -6], [-6, 6]]);
                              }
                            }
                          }
                        }
                      }
                    }
                  }
                }
              }
            }
          }
        }
      }
    }
    translate ([0, 0, 14.5]) {
      rotate (a=14.999999999999998, v=[0, 1, 0]) {
        translate ([0, 0, 0]) {
          translate ([0, 0, 236.77818057271747]) {
            rotate (a=-5.0, v=[0, 1, 0]) {
              translate ([0, 0, -236.77818057271747]) {
                translate ([0, 0, 82.96861330108649]) {
                  rotate (a=0.0, v=[1, 0, 0]) {
                    translate ([0, 0, -82.96861330108649]) {
                      color ([44/51, 163/255, 163/255, 1]) {
                        translate ([0, 0, 7]) {
                          hull () {
                            translate ([0, 0, 0.05]) {
                              linear_extrude (height=0.1, twist=0.0, convexity=0, center=true){
                                polygon (points=[[9.25, 9.25], [9.25, -9.25], [-9.25, -9.25], [-9.25, 9.25]]);
                              }
                            }
                            translate ([0, 0, 6]) {
                              linear_extrude (height=0.1, twist=0.0, convexity=0, center=true){
                                polygon (points=[[3.7, 3.7], [3.7, -3.7], [-3.7, -3.7], [-3.7, 3.7]]);
                              }
                            }
                            translate ([0, 0, 7.4]) {
                              linear_extrude (height=0.1, twist=0.0, convexity=0, center=true){
                                polygon (points=[[6, 6], [6, -6], [-6, -6], [-6, 6]]);
                              }
                            }
                          }
                        }
                      }
                    }
                  }
                }
              }
            }
          }
        }
      }
    }
    translate ([0, 0, 14.5]) {
      rotate (a=14.999999999999998, v=[0, 1, 0]) {
        translate ([0, 0, 0]) {
          translate ([0, 0, 236.77818057271747]) {
            rotate (a=-5.0, v=[0, 1, 0]) {
              translate ([0, 0, -236.77818057271747]) {
                translate ([0, 0, 82.96861330108649]) {
                  rotate (a=-14.999999999999998, v=[1, 0, 0]) {
                    translate ([0, 0, -82.96861330108649]) {
                      color ([44/51, 163/255, 163/255, 1]) {
                        translate ([0, 0, 7]) {
                          hull () {
                            translate ([0, 0, 0.05]) {
                              linear_extrude (height=0.1, twist=0.0, convexity=0, center=true){
                                polygon (points=[[9.25, 9.25], [9.25, -9.25], [-9.25, -9.25], [-9.25, 9.25]]);
                              }
                            }
                            translate ([0, 0, 6]) {
                              linear_extrude (height=0.1, twist=0.0, convexity=0, center=true){
                                polygon (points=[[3.7, 3.7], [3.7, -3.7], [-3.7, -3.7], [-3.7, 3.7]]);
                              }
                            }
                            translate ([0, 0, 7.4]) {
                              linear_extrude (height=0.1, twist=0.0, convexity=0, center=true){
                                polygon (points=[[6, 6], [6, -6], [-6, -6], [-6, 6]]);
                              }
                            }
                          }
                        }
                      }
                    }
                  }
                }
              }
            }
          }
        }
      }
    }
    translate ([0, 0, 14.5]) {
      rotate (a=14.999999999999998, v=[0, 1, 0]) {
        translate ([0, 0, 0]) {
          translate ([0, 0, 236.77818057271747]) {
            rotate (a=-5.0, v=[0, 1, 0]) {
              translate ([0, 0, -236.77818057271747]) {
                translate ([0, 0, 82.96861330108649]) {
                  rotate (a=-29.999999999999996, v=[1, 0, 0]) {
                    translate ([0, 0, -82.96861330108649]) {
                      color ([44/51, 163/255, 163/255, 1]) {
                        translate ([0, 0, 7]) {
                          hull () {
                            translate ([0, 0, 0.05]) {
                              linear_extrude (height=0.1, twist=0.0, convexity=0, center=true){
                                polygon (points=[[9.25, 9.25], [9.25, -9.25], [-9.25, -9.25], [-9.25, 9.25]]);
                              }
                            }
                            translate ([0, 0, 6]) {
                              linear_extrude (height=0.1, twist=0.0, convexity=0, center=true){
                                polygon (points=[[3.7, 3.7], [3.7, -3.7], [-3.7, -3.7], [-3.7, 3.7]]);
                              }
                            }
                            translate ([0, 0, 7.4]) {
                              linear_extrude (height=0.1, twist=0.0, convexity=0, center=true){
                                polygon (points=[[6, 6], [6, -6], [-6, -6], [-6, 6]]);
                              }
                            }
                          }
                        }
                      }
                    }
                  }
                }
              }
            }
          }
        }
      }
    }
    translate ([0, 0, 14.5]) {
      rotate (a=14.999999999999998, v=[0, 1, 0]) {
        translate ([0, -5.8, 5.64]) {
          translate ([0, 0, 236.77818057271747]) {
            rotate (a=-10.0, v=[0, 1, 0]) {
              translate ([0, 0, -236.77818057271747]) {
                translate ([0, 0, 82.96861330108649]) {
                  rotate (a=29.999999999999996, v=[1, 0, 0]) {
                    translate ([0, 0, -82.96861330108649]) {
                      color ([44/51, 163/255, 163/255, 1]) {
                        translate ([0, 0, 7]) {
                          hull () {
                            translate ([0, 0, 0.05]) {
                              linear_extrude (height=0.1, twist=0.0, convexity=0, center=true){
                                polygon (points=[[9.25, 9.25], [9.25, -9.25], [-9.25, -9.25], [-9.25, 9.25]]);
                              }
                            }
                            translate ([0, 0, 6]) {
                              linear_extrude (height=0.1, twist=0.0, convexity=0, center=true){
                                polygon (points=[[3.7, 3.7], [3.7, -3.7], [-3.7, -3.7], [-3.7, 3.7]]);
                              }
                            }
                            translate ([0, 0, 7.4]) {
                              linear_extrude (height=0.1, twist=0.0, convexity=0, center=true){
                                polygon (points=[[6, 6], [6, -6], [-6, -6], [-6, 6]]);
                              }
                            }
                          }
                        }
                      }
                    }
                  }
                }
              }
            }
          }
        }
      }
    }
    translate ([0, 0, 14.5]) {
      rotate (a=14.999999999999998, v=[0, 1, 0]) {
        translate ([0, -5.8, 5.64]) {
          translate ([0, 0, 236.77818057271747]) {
            rotate (a=-10.0, v=[0, 1, 0]) {
              translate ([0, 0, -236.77818057271747]) {
                translate ([0, 0, 82.96861330108649]) {
                  rotate (a=14.999999999999998, v=[1, 0, 0]) {
                    translate ([0, 0, -82.96861330108649]) {
                      color ([44/51, 163/255, 163/255, 1]) {
                        translate ([0, 0, 7]) {
                          hull () {
                            translate ([0, 0, 0.05]) {
                              linear_extrude (height=0.1, twist=0.0, convexity=0, center=true){
                                polygon (points=[[9.25, 9.25], [9.25, -9.25], [-9.25, -9.25], [-9.25, 9.25]]);
                              }
                            }
                            translate ([0, 0, 6]) {
                              linear_extrude (height=0.1, twist=0.0, convexity=0, center=true){
                                polygon (points=[[3.7, 3.7], [3.7, -3.7], [-3.7, -3.7], [-3.7, 3.7]]);
                              }
                            }
                            translate ([0, 0, 7.4]) {
                              linear_extrude (height=0.1, twist=0.0, convexity=0, center=true){
                                polygon (points=[[6, 6], [6, -6], [-6, -6], [-6, 6]]);
                              }
                            }
                          }
                        }
                      }
                    }
                  }
                }
              }
            }
          }
        }
      }
    }
    translate ([0, 0, 14.5]) {
      rotate (a=14.999999999999998, v=[0, 1, 0]) {
        translate ([0, -5.8, 5.64]) {
          translate ([0, 0, 236.77818057271747]) {
            rotate (a=-10.0, v=[0, 1, 0]) {
              translate ([0, 0, -236.77818057271747]) {
                translate ([0, 0, 82.96861330108649]) {
                  rotate (a=0.0, v=[1, 0, 0]) {
                    translate ([0, 0, -82.96861330108649]) {
                      color ([44/51, 163/255, 163/255, 1]) {
                        translate ([0, 0, 7]) {
                          hull () {
                            translate ([0, 0, 0.05]) {
                              linear_extrude (height=0.1, twist=0.0, convexity=0, center=true){
                                polygon (points=[[9.25, 9.25], [9.25, -9.25], [-9.25, -9.25], [-9.25, 9.25]]);
                              }
                            }
                            translate ([0, 0, 6]) {
                              linear_extrude (height=0.1, twist=0.0, convexity=0, center=true){
                                polygon (points=[[3.7, 3.7], [3.7, -3.7], [-3.7, -3.7], [-3.7, 3.7]]);
                              }
                            }
                            translate ([0, 0, 7.4]) {
                              linear_extrude (height=0.1, twist=0.0, convexity=0, center=true){
                                polygon (points=[[6, 6], [6, -6], [-6, -6], [-6, 6]]);
                              }
                            }
                          }
                        }
                      }
                    }
                  }
                }
              }
            }
          }
        }
      }
    }
    translate ([0, 0, 14.5]) {
      rotate (a=14.999999999999998, v=[0, 1, 0]) {
        translate ([0, -5.8, 5.64]) {
          translate ([0, 0, 236.77818057271747]) {
            rotate (a=-10.0, v=[0, 1, 0]) {
              translate ([0, 0, -236.77818057271747]) {
                translate ([0, 0, 82.96861330108649]) {
                  rotate (a=-14.999999999999998, v=[1, 0, 0]) {
                    translate ([0, 0, -82.96861330108649]) {
                      color ([44/51, 163/255, 163/255, 1]) {
                        translate ([0, 0, 7]) {
                          hull () {
                            translate ([0, 0, 0.05]) {
                              linear_extrude (height=0.1, twist=0.0, convexity=0, center=true){
                                polygon (points=[[9.25, 9.25], [9.25, -9.25], [-9.25, -9.25], [-9.25, 9.25]]);
                              }
                            }
                            translate ([0, 0, 6]) {
                              linear_extrude (height=0.1, twist=0.0, convexity=0, center=true){
                                polygon (points=[[3.7, 3.7], [3.7, -3.7], [-3.7, -3.7], [-3.7, 3.7]]);
                              }
                            }
                            translate ([0, 0, 7.4]) {
                              linear_extrude (height=0.1, twist=0.0, convexity=0, center=true){
                                polygon (points=[[6, 6], [6, -6], [-6, -6], [-6, 6]]);
                              }
                            }
                          }
                        }
                      }
                    }
                  }
                }
              }
            }
          }
        }
      }
    }
    translate ([0, 0, 14.5]) {
      rotate (a=14.999999999999998, v=[0, 1, 0]) {
        translate ([0, -5.8, 5.64]) {
          translate ([0, 0, 236.77818057271747]) {
            rotate (a=-10.0, v=[0, 1, 0]) {
              translate ([0, 0, -236.77818057271747]) {
                translate ([0, 0, 82.96861330108649]) {
                  rotate (a=-29.999999999999996, v=[1, 0, 0]) {
                    translate ([0, 0, -82.96861330108649]) {
                      color ([44/51, 163/255, 163/255, 1]) {
                        translate ([0, 0, 7]) {
                          hull () {
                            translate ([0, 0, 0.05]) {
                              linear_extrude (height=0.1, twist=0.0, convexity=0, center=true){
                                polygon (points=[[9.25, 9.25], [9.25, -9.25], [-9.25, -9.25], [-9.25, 9.25]]);
                              }
                            }
                            translate ([0, 0, 6]) {
                              linear_extrude (height=0.1, twist=0.0, convexity=0, center=true){
                                polygon (points=[[3.7, 3.7], [3.7, -3.7], [-3.7, -3.7], [-3.7, 3.7]]);
                              }
                            }
                            translate ([0, 0, 7.4]) {
                              linear_extrude (height=0.1, twist=0.0, convexity=0, center=true){
                                polygon (points=[[6, 6], [6, -6], [-6, -6], [-6, 6]]);
                              }
                            }
                          }
                        }
                      }
                    }
                  }
                }
              }
            }
          }
        }
      }
    }
    translate ([0, 0, 14.5]) {
      rotate (a=14.999999999999998, v=[0, 1, 0]) {
        translate ([5.2, -5.8, 7.01]) {
          translate ([0, 0, 236.77818057271747]) {
            rotate (a=-14.999999999999998, v=[0, 1, 0]) {
              translate ([0, 0, -236.77818057271747]) {
                translate ([0, 0, 82.96861330108649]) {
                  rotate (a=29.999999999999996, v=[1, 0, 0]) {
                    translate ([0, 0, -82.96861330108649]) {
                      color ([16/17, 223/255, 35/51, 1]) {
                        translate ([0, 0, 7]) {
                          hull () {
                            translate ([0, 0, 0.05]) {
                              linear_extrude (height=0.1, twist=0.0, convexity=0, center=true){
                                polygon (points=[[14, 9.125], [14, -9.125], [-14, -9.125], [-14, 9.125]]);
                              }
                            }
                            translate ([0, 0, 7.4]) {
                              linear_extrude (height=0.1, twist=0.0, convexity=0, center=true){
                                polygon (points=[[11, 6], [-11, 6], [-11, -6], [11, -6]]);
                              }
                            }
                          }
                        }
                      }
                    }
                  }
                }
              }
            }
          }
        }
      }
    }
    translate ([0, 0, 14.5]) {
      rotate (a=14.999999999999998, v=[0, 1, 0]) {
        translate ([5.2, -5.8, 7.01]) {
          translate ([0, 0, 236.77818057271747]) {
            rotate (a=-14.999999999999998, v=[0, 1, 0]) {
              translate ([0, 0, -236.77818057271747]) {
                translate ([0, 0, 82.96861330108649]) {
                  rotate (a=14.999999999999998, v=[1, 0, 0]) {
                    translate ([0, 0, -82.96861330108649]) {
                      color ([16/17, 223/255, 35/51, 1]) {
                        translate ([0, 0, 7]) {
                          hull () {
                            translate ([0, 0, 0.05]) {
                              linear_extrude (height=0.1, twist=0.0, convexity=0, center=true){
                                polygon (points=[[14, 9.125], [14, -9.125], [-14, -9.125], [-14, 9.125]]);
                              }
                            }
                            translate ([0, 0, 7.4]) {
                              linear_extrude (height=0.1, twist=0.0, convexity=0, center=true){
                                polygon (points=[[11, 6], [-11, 6], [-11, -6], [11, -6]]);
                              }
                            }
                          }
                        }
                      }
                    }
                  }
                }
              }
            }
          }
        }
      }
    }
    translate ([0, 0, 14.5]) {
      rotate (a=14.999999999999998, v=[0, 1, 0]) {
        translate ([5.2, -5.8, 7.01]) {
          translate ([0, 0, 236.77818057271747]) {
            rotate (a=-14.999999999999998, v=[0, 1, 0]) {
              translate ([0, 0, -236.77818057271747]) {
                translate ([0, 0, 82.96861330108649]) {
                  rotate (a=0.0, v=[1, 0, 0]) {
                    translate ([0, 0, -82.96861330108649]) {
                      color ([16/17, 223/255, 35/51, 1]) {
                        translate ([0, 0, 7]) {
                          hull () {
                            translate ([0, 0, 0.05]) {
                              linear_extrude (height=0.1, twist=0.0, convexity=0, center=true){
                                polygon (points=[[14, 9.125], [14, -9.125], [-14, -9.125], [-14, 9.125]]);
                              }
                            }
                            translate ([0, 0, 7.4]) {
                              linear_extrude (height=0.1, twist=0.0, convexity=0, center=true){
                                polygon (points=[[11, 6], [-11, 6], [-11, -6], [11, -6]]);
                              }
                            }
                          }
                        }
                      }
                    }
                  }
                }
              }
            }
          }
        }
      }
    }
    translate ([0, 0, 14.5]) {
      rotate (a=14.999999999999998, v=[0, 1, 0]) {
        translate ([5.2, -5.8, 7.01]) {
          translate ([0, 0, 236.77818057271747]) {
            rotate (a=-14.999999999999998, v=[0, 1, 0]) {
              translate ([0, 0, -236.77818057271747]) {
                translate ([0, 0, 82.96861330108649]) {
                  rotate (a=-14.999999999999998, v=[1, 0, 0]) {
                    translate ([0, 0, -82.96861330108649]) {
                      color ([16/17, 223/255, 35/51, 1]) {
                        translate ([0, 0, 7]) {
                          hull () {
                            translate ([0, 0, 0.05]) {
                              linear_extrude (height=0.1, twist=0.0, convexity=0, center=true){
                                polygon (points=[[14, 9.125], [14, -9.125], [-14, -9.125], [-14, 9.125]]);
                              }
                            }
                            translate ([0, 0, 7.4]) {
                              linear_extrude (height=0.1, twist=0.0, convexity=0, center=true){
                                polygon (points=[[11, 6], [-11, 6], [-11, -6], [11, -6]]);
                              }
                            }
                          }
                        }
                      }
                    }
                  }
                }
              }
            }
          }
        }
      }
    }
    translate ([0, 0, 14.5]) {
      rotate (a=14.999999999999998, v=[0, 1, 0]) {
        translate ([0.5, -5.8, 5.7]) {
          translate ([0, 0, 236.77818057271747]) {
            rotate (a=-14.999999999999998, v=[0, 1, 0]) {
              translate ([0, 0, -236.77818057271747]) {
                translate ([0, 0, 82.96861330108649]) {
                  rotate (a=-29.999999999999996, v=[1, 0, 0]) {
                    translate ([0, 0, -82.96861330108649]) {
                      color ([44/51, 163/255, 163/255, 1]) {
                        translate ([0, 0, 7]) {
                          hull () {
                            translate ([0, 0, 0.05]) {
                              linear_extrude (height=0.1, twist=0.0, convexity=0, center=true){
                                polygon (points=[[9.25, 9.25], [9.25, -9.25], [-9.25, -9.25], [-9.25, 9.25]]);
                              }
                            }
                            translate ([0, 0, 6]) {
                              linear_extrude (height=0.1, twist=0.0, convexity=0, center=true){
                                polygon (points=[[3.7, 3.7], [3.7, -3.7], [-3.7, -3.7], [-3.7, 3.7]]);
                              }
                            }
                            translate ([0, 0, 7.4]) {
                              linear_extrude (height=0.1, twist=0.0, convexity=0, center=true){
                                polygon (points=[[6, 6], [6, -6], [-6, -6], [-6, 6]]);
                              }
                            }
                          }
                        }
                      }
                    }
                  }
                }
              }
            }
          }
        }
      }
    }
  }
}
